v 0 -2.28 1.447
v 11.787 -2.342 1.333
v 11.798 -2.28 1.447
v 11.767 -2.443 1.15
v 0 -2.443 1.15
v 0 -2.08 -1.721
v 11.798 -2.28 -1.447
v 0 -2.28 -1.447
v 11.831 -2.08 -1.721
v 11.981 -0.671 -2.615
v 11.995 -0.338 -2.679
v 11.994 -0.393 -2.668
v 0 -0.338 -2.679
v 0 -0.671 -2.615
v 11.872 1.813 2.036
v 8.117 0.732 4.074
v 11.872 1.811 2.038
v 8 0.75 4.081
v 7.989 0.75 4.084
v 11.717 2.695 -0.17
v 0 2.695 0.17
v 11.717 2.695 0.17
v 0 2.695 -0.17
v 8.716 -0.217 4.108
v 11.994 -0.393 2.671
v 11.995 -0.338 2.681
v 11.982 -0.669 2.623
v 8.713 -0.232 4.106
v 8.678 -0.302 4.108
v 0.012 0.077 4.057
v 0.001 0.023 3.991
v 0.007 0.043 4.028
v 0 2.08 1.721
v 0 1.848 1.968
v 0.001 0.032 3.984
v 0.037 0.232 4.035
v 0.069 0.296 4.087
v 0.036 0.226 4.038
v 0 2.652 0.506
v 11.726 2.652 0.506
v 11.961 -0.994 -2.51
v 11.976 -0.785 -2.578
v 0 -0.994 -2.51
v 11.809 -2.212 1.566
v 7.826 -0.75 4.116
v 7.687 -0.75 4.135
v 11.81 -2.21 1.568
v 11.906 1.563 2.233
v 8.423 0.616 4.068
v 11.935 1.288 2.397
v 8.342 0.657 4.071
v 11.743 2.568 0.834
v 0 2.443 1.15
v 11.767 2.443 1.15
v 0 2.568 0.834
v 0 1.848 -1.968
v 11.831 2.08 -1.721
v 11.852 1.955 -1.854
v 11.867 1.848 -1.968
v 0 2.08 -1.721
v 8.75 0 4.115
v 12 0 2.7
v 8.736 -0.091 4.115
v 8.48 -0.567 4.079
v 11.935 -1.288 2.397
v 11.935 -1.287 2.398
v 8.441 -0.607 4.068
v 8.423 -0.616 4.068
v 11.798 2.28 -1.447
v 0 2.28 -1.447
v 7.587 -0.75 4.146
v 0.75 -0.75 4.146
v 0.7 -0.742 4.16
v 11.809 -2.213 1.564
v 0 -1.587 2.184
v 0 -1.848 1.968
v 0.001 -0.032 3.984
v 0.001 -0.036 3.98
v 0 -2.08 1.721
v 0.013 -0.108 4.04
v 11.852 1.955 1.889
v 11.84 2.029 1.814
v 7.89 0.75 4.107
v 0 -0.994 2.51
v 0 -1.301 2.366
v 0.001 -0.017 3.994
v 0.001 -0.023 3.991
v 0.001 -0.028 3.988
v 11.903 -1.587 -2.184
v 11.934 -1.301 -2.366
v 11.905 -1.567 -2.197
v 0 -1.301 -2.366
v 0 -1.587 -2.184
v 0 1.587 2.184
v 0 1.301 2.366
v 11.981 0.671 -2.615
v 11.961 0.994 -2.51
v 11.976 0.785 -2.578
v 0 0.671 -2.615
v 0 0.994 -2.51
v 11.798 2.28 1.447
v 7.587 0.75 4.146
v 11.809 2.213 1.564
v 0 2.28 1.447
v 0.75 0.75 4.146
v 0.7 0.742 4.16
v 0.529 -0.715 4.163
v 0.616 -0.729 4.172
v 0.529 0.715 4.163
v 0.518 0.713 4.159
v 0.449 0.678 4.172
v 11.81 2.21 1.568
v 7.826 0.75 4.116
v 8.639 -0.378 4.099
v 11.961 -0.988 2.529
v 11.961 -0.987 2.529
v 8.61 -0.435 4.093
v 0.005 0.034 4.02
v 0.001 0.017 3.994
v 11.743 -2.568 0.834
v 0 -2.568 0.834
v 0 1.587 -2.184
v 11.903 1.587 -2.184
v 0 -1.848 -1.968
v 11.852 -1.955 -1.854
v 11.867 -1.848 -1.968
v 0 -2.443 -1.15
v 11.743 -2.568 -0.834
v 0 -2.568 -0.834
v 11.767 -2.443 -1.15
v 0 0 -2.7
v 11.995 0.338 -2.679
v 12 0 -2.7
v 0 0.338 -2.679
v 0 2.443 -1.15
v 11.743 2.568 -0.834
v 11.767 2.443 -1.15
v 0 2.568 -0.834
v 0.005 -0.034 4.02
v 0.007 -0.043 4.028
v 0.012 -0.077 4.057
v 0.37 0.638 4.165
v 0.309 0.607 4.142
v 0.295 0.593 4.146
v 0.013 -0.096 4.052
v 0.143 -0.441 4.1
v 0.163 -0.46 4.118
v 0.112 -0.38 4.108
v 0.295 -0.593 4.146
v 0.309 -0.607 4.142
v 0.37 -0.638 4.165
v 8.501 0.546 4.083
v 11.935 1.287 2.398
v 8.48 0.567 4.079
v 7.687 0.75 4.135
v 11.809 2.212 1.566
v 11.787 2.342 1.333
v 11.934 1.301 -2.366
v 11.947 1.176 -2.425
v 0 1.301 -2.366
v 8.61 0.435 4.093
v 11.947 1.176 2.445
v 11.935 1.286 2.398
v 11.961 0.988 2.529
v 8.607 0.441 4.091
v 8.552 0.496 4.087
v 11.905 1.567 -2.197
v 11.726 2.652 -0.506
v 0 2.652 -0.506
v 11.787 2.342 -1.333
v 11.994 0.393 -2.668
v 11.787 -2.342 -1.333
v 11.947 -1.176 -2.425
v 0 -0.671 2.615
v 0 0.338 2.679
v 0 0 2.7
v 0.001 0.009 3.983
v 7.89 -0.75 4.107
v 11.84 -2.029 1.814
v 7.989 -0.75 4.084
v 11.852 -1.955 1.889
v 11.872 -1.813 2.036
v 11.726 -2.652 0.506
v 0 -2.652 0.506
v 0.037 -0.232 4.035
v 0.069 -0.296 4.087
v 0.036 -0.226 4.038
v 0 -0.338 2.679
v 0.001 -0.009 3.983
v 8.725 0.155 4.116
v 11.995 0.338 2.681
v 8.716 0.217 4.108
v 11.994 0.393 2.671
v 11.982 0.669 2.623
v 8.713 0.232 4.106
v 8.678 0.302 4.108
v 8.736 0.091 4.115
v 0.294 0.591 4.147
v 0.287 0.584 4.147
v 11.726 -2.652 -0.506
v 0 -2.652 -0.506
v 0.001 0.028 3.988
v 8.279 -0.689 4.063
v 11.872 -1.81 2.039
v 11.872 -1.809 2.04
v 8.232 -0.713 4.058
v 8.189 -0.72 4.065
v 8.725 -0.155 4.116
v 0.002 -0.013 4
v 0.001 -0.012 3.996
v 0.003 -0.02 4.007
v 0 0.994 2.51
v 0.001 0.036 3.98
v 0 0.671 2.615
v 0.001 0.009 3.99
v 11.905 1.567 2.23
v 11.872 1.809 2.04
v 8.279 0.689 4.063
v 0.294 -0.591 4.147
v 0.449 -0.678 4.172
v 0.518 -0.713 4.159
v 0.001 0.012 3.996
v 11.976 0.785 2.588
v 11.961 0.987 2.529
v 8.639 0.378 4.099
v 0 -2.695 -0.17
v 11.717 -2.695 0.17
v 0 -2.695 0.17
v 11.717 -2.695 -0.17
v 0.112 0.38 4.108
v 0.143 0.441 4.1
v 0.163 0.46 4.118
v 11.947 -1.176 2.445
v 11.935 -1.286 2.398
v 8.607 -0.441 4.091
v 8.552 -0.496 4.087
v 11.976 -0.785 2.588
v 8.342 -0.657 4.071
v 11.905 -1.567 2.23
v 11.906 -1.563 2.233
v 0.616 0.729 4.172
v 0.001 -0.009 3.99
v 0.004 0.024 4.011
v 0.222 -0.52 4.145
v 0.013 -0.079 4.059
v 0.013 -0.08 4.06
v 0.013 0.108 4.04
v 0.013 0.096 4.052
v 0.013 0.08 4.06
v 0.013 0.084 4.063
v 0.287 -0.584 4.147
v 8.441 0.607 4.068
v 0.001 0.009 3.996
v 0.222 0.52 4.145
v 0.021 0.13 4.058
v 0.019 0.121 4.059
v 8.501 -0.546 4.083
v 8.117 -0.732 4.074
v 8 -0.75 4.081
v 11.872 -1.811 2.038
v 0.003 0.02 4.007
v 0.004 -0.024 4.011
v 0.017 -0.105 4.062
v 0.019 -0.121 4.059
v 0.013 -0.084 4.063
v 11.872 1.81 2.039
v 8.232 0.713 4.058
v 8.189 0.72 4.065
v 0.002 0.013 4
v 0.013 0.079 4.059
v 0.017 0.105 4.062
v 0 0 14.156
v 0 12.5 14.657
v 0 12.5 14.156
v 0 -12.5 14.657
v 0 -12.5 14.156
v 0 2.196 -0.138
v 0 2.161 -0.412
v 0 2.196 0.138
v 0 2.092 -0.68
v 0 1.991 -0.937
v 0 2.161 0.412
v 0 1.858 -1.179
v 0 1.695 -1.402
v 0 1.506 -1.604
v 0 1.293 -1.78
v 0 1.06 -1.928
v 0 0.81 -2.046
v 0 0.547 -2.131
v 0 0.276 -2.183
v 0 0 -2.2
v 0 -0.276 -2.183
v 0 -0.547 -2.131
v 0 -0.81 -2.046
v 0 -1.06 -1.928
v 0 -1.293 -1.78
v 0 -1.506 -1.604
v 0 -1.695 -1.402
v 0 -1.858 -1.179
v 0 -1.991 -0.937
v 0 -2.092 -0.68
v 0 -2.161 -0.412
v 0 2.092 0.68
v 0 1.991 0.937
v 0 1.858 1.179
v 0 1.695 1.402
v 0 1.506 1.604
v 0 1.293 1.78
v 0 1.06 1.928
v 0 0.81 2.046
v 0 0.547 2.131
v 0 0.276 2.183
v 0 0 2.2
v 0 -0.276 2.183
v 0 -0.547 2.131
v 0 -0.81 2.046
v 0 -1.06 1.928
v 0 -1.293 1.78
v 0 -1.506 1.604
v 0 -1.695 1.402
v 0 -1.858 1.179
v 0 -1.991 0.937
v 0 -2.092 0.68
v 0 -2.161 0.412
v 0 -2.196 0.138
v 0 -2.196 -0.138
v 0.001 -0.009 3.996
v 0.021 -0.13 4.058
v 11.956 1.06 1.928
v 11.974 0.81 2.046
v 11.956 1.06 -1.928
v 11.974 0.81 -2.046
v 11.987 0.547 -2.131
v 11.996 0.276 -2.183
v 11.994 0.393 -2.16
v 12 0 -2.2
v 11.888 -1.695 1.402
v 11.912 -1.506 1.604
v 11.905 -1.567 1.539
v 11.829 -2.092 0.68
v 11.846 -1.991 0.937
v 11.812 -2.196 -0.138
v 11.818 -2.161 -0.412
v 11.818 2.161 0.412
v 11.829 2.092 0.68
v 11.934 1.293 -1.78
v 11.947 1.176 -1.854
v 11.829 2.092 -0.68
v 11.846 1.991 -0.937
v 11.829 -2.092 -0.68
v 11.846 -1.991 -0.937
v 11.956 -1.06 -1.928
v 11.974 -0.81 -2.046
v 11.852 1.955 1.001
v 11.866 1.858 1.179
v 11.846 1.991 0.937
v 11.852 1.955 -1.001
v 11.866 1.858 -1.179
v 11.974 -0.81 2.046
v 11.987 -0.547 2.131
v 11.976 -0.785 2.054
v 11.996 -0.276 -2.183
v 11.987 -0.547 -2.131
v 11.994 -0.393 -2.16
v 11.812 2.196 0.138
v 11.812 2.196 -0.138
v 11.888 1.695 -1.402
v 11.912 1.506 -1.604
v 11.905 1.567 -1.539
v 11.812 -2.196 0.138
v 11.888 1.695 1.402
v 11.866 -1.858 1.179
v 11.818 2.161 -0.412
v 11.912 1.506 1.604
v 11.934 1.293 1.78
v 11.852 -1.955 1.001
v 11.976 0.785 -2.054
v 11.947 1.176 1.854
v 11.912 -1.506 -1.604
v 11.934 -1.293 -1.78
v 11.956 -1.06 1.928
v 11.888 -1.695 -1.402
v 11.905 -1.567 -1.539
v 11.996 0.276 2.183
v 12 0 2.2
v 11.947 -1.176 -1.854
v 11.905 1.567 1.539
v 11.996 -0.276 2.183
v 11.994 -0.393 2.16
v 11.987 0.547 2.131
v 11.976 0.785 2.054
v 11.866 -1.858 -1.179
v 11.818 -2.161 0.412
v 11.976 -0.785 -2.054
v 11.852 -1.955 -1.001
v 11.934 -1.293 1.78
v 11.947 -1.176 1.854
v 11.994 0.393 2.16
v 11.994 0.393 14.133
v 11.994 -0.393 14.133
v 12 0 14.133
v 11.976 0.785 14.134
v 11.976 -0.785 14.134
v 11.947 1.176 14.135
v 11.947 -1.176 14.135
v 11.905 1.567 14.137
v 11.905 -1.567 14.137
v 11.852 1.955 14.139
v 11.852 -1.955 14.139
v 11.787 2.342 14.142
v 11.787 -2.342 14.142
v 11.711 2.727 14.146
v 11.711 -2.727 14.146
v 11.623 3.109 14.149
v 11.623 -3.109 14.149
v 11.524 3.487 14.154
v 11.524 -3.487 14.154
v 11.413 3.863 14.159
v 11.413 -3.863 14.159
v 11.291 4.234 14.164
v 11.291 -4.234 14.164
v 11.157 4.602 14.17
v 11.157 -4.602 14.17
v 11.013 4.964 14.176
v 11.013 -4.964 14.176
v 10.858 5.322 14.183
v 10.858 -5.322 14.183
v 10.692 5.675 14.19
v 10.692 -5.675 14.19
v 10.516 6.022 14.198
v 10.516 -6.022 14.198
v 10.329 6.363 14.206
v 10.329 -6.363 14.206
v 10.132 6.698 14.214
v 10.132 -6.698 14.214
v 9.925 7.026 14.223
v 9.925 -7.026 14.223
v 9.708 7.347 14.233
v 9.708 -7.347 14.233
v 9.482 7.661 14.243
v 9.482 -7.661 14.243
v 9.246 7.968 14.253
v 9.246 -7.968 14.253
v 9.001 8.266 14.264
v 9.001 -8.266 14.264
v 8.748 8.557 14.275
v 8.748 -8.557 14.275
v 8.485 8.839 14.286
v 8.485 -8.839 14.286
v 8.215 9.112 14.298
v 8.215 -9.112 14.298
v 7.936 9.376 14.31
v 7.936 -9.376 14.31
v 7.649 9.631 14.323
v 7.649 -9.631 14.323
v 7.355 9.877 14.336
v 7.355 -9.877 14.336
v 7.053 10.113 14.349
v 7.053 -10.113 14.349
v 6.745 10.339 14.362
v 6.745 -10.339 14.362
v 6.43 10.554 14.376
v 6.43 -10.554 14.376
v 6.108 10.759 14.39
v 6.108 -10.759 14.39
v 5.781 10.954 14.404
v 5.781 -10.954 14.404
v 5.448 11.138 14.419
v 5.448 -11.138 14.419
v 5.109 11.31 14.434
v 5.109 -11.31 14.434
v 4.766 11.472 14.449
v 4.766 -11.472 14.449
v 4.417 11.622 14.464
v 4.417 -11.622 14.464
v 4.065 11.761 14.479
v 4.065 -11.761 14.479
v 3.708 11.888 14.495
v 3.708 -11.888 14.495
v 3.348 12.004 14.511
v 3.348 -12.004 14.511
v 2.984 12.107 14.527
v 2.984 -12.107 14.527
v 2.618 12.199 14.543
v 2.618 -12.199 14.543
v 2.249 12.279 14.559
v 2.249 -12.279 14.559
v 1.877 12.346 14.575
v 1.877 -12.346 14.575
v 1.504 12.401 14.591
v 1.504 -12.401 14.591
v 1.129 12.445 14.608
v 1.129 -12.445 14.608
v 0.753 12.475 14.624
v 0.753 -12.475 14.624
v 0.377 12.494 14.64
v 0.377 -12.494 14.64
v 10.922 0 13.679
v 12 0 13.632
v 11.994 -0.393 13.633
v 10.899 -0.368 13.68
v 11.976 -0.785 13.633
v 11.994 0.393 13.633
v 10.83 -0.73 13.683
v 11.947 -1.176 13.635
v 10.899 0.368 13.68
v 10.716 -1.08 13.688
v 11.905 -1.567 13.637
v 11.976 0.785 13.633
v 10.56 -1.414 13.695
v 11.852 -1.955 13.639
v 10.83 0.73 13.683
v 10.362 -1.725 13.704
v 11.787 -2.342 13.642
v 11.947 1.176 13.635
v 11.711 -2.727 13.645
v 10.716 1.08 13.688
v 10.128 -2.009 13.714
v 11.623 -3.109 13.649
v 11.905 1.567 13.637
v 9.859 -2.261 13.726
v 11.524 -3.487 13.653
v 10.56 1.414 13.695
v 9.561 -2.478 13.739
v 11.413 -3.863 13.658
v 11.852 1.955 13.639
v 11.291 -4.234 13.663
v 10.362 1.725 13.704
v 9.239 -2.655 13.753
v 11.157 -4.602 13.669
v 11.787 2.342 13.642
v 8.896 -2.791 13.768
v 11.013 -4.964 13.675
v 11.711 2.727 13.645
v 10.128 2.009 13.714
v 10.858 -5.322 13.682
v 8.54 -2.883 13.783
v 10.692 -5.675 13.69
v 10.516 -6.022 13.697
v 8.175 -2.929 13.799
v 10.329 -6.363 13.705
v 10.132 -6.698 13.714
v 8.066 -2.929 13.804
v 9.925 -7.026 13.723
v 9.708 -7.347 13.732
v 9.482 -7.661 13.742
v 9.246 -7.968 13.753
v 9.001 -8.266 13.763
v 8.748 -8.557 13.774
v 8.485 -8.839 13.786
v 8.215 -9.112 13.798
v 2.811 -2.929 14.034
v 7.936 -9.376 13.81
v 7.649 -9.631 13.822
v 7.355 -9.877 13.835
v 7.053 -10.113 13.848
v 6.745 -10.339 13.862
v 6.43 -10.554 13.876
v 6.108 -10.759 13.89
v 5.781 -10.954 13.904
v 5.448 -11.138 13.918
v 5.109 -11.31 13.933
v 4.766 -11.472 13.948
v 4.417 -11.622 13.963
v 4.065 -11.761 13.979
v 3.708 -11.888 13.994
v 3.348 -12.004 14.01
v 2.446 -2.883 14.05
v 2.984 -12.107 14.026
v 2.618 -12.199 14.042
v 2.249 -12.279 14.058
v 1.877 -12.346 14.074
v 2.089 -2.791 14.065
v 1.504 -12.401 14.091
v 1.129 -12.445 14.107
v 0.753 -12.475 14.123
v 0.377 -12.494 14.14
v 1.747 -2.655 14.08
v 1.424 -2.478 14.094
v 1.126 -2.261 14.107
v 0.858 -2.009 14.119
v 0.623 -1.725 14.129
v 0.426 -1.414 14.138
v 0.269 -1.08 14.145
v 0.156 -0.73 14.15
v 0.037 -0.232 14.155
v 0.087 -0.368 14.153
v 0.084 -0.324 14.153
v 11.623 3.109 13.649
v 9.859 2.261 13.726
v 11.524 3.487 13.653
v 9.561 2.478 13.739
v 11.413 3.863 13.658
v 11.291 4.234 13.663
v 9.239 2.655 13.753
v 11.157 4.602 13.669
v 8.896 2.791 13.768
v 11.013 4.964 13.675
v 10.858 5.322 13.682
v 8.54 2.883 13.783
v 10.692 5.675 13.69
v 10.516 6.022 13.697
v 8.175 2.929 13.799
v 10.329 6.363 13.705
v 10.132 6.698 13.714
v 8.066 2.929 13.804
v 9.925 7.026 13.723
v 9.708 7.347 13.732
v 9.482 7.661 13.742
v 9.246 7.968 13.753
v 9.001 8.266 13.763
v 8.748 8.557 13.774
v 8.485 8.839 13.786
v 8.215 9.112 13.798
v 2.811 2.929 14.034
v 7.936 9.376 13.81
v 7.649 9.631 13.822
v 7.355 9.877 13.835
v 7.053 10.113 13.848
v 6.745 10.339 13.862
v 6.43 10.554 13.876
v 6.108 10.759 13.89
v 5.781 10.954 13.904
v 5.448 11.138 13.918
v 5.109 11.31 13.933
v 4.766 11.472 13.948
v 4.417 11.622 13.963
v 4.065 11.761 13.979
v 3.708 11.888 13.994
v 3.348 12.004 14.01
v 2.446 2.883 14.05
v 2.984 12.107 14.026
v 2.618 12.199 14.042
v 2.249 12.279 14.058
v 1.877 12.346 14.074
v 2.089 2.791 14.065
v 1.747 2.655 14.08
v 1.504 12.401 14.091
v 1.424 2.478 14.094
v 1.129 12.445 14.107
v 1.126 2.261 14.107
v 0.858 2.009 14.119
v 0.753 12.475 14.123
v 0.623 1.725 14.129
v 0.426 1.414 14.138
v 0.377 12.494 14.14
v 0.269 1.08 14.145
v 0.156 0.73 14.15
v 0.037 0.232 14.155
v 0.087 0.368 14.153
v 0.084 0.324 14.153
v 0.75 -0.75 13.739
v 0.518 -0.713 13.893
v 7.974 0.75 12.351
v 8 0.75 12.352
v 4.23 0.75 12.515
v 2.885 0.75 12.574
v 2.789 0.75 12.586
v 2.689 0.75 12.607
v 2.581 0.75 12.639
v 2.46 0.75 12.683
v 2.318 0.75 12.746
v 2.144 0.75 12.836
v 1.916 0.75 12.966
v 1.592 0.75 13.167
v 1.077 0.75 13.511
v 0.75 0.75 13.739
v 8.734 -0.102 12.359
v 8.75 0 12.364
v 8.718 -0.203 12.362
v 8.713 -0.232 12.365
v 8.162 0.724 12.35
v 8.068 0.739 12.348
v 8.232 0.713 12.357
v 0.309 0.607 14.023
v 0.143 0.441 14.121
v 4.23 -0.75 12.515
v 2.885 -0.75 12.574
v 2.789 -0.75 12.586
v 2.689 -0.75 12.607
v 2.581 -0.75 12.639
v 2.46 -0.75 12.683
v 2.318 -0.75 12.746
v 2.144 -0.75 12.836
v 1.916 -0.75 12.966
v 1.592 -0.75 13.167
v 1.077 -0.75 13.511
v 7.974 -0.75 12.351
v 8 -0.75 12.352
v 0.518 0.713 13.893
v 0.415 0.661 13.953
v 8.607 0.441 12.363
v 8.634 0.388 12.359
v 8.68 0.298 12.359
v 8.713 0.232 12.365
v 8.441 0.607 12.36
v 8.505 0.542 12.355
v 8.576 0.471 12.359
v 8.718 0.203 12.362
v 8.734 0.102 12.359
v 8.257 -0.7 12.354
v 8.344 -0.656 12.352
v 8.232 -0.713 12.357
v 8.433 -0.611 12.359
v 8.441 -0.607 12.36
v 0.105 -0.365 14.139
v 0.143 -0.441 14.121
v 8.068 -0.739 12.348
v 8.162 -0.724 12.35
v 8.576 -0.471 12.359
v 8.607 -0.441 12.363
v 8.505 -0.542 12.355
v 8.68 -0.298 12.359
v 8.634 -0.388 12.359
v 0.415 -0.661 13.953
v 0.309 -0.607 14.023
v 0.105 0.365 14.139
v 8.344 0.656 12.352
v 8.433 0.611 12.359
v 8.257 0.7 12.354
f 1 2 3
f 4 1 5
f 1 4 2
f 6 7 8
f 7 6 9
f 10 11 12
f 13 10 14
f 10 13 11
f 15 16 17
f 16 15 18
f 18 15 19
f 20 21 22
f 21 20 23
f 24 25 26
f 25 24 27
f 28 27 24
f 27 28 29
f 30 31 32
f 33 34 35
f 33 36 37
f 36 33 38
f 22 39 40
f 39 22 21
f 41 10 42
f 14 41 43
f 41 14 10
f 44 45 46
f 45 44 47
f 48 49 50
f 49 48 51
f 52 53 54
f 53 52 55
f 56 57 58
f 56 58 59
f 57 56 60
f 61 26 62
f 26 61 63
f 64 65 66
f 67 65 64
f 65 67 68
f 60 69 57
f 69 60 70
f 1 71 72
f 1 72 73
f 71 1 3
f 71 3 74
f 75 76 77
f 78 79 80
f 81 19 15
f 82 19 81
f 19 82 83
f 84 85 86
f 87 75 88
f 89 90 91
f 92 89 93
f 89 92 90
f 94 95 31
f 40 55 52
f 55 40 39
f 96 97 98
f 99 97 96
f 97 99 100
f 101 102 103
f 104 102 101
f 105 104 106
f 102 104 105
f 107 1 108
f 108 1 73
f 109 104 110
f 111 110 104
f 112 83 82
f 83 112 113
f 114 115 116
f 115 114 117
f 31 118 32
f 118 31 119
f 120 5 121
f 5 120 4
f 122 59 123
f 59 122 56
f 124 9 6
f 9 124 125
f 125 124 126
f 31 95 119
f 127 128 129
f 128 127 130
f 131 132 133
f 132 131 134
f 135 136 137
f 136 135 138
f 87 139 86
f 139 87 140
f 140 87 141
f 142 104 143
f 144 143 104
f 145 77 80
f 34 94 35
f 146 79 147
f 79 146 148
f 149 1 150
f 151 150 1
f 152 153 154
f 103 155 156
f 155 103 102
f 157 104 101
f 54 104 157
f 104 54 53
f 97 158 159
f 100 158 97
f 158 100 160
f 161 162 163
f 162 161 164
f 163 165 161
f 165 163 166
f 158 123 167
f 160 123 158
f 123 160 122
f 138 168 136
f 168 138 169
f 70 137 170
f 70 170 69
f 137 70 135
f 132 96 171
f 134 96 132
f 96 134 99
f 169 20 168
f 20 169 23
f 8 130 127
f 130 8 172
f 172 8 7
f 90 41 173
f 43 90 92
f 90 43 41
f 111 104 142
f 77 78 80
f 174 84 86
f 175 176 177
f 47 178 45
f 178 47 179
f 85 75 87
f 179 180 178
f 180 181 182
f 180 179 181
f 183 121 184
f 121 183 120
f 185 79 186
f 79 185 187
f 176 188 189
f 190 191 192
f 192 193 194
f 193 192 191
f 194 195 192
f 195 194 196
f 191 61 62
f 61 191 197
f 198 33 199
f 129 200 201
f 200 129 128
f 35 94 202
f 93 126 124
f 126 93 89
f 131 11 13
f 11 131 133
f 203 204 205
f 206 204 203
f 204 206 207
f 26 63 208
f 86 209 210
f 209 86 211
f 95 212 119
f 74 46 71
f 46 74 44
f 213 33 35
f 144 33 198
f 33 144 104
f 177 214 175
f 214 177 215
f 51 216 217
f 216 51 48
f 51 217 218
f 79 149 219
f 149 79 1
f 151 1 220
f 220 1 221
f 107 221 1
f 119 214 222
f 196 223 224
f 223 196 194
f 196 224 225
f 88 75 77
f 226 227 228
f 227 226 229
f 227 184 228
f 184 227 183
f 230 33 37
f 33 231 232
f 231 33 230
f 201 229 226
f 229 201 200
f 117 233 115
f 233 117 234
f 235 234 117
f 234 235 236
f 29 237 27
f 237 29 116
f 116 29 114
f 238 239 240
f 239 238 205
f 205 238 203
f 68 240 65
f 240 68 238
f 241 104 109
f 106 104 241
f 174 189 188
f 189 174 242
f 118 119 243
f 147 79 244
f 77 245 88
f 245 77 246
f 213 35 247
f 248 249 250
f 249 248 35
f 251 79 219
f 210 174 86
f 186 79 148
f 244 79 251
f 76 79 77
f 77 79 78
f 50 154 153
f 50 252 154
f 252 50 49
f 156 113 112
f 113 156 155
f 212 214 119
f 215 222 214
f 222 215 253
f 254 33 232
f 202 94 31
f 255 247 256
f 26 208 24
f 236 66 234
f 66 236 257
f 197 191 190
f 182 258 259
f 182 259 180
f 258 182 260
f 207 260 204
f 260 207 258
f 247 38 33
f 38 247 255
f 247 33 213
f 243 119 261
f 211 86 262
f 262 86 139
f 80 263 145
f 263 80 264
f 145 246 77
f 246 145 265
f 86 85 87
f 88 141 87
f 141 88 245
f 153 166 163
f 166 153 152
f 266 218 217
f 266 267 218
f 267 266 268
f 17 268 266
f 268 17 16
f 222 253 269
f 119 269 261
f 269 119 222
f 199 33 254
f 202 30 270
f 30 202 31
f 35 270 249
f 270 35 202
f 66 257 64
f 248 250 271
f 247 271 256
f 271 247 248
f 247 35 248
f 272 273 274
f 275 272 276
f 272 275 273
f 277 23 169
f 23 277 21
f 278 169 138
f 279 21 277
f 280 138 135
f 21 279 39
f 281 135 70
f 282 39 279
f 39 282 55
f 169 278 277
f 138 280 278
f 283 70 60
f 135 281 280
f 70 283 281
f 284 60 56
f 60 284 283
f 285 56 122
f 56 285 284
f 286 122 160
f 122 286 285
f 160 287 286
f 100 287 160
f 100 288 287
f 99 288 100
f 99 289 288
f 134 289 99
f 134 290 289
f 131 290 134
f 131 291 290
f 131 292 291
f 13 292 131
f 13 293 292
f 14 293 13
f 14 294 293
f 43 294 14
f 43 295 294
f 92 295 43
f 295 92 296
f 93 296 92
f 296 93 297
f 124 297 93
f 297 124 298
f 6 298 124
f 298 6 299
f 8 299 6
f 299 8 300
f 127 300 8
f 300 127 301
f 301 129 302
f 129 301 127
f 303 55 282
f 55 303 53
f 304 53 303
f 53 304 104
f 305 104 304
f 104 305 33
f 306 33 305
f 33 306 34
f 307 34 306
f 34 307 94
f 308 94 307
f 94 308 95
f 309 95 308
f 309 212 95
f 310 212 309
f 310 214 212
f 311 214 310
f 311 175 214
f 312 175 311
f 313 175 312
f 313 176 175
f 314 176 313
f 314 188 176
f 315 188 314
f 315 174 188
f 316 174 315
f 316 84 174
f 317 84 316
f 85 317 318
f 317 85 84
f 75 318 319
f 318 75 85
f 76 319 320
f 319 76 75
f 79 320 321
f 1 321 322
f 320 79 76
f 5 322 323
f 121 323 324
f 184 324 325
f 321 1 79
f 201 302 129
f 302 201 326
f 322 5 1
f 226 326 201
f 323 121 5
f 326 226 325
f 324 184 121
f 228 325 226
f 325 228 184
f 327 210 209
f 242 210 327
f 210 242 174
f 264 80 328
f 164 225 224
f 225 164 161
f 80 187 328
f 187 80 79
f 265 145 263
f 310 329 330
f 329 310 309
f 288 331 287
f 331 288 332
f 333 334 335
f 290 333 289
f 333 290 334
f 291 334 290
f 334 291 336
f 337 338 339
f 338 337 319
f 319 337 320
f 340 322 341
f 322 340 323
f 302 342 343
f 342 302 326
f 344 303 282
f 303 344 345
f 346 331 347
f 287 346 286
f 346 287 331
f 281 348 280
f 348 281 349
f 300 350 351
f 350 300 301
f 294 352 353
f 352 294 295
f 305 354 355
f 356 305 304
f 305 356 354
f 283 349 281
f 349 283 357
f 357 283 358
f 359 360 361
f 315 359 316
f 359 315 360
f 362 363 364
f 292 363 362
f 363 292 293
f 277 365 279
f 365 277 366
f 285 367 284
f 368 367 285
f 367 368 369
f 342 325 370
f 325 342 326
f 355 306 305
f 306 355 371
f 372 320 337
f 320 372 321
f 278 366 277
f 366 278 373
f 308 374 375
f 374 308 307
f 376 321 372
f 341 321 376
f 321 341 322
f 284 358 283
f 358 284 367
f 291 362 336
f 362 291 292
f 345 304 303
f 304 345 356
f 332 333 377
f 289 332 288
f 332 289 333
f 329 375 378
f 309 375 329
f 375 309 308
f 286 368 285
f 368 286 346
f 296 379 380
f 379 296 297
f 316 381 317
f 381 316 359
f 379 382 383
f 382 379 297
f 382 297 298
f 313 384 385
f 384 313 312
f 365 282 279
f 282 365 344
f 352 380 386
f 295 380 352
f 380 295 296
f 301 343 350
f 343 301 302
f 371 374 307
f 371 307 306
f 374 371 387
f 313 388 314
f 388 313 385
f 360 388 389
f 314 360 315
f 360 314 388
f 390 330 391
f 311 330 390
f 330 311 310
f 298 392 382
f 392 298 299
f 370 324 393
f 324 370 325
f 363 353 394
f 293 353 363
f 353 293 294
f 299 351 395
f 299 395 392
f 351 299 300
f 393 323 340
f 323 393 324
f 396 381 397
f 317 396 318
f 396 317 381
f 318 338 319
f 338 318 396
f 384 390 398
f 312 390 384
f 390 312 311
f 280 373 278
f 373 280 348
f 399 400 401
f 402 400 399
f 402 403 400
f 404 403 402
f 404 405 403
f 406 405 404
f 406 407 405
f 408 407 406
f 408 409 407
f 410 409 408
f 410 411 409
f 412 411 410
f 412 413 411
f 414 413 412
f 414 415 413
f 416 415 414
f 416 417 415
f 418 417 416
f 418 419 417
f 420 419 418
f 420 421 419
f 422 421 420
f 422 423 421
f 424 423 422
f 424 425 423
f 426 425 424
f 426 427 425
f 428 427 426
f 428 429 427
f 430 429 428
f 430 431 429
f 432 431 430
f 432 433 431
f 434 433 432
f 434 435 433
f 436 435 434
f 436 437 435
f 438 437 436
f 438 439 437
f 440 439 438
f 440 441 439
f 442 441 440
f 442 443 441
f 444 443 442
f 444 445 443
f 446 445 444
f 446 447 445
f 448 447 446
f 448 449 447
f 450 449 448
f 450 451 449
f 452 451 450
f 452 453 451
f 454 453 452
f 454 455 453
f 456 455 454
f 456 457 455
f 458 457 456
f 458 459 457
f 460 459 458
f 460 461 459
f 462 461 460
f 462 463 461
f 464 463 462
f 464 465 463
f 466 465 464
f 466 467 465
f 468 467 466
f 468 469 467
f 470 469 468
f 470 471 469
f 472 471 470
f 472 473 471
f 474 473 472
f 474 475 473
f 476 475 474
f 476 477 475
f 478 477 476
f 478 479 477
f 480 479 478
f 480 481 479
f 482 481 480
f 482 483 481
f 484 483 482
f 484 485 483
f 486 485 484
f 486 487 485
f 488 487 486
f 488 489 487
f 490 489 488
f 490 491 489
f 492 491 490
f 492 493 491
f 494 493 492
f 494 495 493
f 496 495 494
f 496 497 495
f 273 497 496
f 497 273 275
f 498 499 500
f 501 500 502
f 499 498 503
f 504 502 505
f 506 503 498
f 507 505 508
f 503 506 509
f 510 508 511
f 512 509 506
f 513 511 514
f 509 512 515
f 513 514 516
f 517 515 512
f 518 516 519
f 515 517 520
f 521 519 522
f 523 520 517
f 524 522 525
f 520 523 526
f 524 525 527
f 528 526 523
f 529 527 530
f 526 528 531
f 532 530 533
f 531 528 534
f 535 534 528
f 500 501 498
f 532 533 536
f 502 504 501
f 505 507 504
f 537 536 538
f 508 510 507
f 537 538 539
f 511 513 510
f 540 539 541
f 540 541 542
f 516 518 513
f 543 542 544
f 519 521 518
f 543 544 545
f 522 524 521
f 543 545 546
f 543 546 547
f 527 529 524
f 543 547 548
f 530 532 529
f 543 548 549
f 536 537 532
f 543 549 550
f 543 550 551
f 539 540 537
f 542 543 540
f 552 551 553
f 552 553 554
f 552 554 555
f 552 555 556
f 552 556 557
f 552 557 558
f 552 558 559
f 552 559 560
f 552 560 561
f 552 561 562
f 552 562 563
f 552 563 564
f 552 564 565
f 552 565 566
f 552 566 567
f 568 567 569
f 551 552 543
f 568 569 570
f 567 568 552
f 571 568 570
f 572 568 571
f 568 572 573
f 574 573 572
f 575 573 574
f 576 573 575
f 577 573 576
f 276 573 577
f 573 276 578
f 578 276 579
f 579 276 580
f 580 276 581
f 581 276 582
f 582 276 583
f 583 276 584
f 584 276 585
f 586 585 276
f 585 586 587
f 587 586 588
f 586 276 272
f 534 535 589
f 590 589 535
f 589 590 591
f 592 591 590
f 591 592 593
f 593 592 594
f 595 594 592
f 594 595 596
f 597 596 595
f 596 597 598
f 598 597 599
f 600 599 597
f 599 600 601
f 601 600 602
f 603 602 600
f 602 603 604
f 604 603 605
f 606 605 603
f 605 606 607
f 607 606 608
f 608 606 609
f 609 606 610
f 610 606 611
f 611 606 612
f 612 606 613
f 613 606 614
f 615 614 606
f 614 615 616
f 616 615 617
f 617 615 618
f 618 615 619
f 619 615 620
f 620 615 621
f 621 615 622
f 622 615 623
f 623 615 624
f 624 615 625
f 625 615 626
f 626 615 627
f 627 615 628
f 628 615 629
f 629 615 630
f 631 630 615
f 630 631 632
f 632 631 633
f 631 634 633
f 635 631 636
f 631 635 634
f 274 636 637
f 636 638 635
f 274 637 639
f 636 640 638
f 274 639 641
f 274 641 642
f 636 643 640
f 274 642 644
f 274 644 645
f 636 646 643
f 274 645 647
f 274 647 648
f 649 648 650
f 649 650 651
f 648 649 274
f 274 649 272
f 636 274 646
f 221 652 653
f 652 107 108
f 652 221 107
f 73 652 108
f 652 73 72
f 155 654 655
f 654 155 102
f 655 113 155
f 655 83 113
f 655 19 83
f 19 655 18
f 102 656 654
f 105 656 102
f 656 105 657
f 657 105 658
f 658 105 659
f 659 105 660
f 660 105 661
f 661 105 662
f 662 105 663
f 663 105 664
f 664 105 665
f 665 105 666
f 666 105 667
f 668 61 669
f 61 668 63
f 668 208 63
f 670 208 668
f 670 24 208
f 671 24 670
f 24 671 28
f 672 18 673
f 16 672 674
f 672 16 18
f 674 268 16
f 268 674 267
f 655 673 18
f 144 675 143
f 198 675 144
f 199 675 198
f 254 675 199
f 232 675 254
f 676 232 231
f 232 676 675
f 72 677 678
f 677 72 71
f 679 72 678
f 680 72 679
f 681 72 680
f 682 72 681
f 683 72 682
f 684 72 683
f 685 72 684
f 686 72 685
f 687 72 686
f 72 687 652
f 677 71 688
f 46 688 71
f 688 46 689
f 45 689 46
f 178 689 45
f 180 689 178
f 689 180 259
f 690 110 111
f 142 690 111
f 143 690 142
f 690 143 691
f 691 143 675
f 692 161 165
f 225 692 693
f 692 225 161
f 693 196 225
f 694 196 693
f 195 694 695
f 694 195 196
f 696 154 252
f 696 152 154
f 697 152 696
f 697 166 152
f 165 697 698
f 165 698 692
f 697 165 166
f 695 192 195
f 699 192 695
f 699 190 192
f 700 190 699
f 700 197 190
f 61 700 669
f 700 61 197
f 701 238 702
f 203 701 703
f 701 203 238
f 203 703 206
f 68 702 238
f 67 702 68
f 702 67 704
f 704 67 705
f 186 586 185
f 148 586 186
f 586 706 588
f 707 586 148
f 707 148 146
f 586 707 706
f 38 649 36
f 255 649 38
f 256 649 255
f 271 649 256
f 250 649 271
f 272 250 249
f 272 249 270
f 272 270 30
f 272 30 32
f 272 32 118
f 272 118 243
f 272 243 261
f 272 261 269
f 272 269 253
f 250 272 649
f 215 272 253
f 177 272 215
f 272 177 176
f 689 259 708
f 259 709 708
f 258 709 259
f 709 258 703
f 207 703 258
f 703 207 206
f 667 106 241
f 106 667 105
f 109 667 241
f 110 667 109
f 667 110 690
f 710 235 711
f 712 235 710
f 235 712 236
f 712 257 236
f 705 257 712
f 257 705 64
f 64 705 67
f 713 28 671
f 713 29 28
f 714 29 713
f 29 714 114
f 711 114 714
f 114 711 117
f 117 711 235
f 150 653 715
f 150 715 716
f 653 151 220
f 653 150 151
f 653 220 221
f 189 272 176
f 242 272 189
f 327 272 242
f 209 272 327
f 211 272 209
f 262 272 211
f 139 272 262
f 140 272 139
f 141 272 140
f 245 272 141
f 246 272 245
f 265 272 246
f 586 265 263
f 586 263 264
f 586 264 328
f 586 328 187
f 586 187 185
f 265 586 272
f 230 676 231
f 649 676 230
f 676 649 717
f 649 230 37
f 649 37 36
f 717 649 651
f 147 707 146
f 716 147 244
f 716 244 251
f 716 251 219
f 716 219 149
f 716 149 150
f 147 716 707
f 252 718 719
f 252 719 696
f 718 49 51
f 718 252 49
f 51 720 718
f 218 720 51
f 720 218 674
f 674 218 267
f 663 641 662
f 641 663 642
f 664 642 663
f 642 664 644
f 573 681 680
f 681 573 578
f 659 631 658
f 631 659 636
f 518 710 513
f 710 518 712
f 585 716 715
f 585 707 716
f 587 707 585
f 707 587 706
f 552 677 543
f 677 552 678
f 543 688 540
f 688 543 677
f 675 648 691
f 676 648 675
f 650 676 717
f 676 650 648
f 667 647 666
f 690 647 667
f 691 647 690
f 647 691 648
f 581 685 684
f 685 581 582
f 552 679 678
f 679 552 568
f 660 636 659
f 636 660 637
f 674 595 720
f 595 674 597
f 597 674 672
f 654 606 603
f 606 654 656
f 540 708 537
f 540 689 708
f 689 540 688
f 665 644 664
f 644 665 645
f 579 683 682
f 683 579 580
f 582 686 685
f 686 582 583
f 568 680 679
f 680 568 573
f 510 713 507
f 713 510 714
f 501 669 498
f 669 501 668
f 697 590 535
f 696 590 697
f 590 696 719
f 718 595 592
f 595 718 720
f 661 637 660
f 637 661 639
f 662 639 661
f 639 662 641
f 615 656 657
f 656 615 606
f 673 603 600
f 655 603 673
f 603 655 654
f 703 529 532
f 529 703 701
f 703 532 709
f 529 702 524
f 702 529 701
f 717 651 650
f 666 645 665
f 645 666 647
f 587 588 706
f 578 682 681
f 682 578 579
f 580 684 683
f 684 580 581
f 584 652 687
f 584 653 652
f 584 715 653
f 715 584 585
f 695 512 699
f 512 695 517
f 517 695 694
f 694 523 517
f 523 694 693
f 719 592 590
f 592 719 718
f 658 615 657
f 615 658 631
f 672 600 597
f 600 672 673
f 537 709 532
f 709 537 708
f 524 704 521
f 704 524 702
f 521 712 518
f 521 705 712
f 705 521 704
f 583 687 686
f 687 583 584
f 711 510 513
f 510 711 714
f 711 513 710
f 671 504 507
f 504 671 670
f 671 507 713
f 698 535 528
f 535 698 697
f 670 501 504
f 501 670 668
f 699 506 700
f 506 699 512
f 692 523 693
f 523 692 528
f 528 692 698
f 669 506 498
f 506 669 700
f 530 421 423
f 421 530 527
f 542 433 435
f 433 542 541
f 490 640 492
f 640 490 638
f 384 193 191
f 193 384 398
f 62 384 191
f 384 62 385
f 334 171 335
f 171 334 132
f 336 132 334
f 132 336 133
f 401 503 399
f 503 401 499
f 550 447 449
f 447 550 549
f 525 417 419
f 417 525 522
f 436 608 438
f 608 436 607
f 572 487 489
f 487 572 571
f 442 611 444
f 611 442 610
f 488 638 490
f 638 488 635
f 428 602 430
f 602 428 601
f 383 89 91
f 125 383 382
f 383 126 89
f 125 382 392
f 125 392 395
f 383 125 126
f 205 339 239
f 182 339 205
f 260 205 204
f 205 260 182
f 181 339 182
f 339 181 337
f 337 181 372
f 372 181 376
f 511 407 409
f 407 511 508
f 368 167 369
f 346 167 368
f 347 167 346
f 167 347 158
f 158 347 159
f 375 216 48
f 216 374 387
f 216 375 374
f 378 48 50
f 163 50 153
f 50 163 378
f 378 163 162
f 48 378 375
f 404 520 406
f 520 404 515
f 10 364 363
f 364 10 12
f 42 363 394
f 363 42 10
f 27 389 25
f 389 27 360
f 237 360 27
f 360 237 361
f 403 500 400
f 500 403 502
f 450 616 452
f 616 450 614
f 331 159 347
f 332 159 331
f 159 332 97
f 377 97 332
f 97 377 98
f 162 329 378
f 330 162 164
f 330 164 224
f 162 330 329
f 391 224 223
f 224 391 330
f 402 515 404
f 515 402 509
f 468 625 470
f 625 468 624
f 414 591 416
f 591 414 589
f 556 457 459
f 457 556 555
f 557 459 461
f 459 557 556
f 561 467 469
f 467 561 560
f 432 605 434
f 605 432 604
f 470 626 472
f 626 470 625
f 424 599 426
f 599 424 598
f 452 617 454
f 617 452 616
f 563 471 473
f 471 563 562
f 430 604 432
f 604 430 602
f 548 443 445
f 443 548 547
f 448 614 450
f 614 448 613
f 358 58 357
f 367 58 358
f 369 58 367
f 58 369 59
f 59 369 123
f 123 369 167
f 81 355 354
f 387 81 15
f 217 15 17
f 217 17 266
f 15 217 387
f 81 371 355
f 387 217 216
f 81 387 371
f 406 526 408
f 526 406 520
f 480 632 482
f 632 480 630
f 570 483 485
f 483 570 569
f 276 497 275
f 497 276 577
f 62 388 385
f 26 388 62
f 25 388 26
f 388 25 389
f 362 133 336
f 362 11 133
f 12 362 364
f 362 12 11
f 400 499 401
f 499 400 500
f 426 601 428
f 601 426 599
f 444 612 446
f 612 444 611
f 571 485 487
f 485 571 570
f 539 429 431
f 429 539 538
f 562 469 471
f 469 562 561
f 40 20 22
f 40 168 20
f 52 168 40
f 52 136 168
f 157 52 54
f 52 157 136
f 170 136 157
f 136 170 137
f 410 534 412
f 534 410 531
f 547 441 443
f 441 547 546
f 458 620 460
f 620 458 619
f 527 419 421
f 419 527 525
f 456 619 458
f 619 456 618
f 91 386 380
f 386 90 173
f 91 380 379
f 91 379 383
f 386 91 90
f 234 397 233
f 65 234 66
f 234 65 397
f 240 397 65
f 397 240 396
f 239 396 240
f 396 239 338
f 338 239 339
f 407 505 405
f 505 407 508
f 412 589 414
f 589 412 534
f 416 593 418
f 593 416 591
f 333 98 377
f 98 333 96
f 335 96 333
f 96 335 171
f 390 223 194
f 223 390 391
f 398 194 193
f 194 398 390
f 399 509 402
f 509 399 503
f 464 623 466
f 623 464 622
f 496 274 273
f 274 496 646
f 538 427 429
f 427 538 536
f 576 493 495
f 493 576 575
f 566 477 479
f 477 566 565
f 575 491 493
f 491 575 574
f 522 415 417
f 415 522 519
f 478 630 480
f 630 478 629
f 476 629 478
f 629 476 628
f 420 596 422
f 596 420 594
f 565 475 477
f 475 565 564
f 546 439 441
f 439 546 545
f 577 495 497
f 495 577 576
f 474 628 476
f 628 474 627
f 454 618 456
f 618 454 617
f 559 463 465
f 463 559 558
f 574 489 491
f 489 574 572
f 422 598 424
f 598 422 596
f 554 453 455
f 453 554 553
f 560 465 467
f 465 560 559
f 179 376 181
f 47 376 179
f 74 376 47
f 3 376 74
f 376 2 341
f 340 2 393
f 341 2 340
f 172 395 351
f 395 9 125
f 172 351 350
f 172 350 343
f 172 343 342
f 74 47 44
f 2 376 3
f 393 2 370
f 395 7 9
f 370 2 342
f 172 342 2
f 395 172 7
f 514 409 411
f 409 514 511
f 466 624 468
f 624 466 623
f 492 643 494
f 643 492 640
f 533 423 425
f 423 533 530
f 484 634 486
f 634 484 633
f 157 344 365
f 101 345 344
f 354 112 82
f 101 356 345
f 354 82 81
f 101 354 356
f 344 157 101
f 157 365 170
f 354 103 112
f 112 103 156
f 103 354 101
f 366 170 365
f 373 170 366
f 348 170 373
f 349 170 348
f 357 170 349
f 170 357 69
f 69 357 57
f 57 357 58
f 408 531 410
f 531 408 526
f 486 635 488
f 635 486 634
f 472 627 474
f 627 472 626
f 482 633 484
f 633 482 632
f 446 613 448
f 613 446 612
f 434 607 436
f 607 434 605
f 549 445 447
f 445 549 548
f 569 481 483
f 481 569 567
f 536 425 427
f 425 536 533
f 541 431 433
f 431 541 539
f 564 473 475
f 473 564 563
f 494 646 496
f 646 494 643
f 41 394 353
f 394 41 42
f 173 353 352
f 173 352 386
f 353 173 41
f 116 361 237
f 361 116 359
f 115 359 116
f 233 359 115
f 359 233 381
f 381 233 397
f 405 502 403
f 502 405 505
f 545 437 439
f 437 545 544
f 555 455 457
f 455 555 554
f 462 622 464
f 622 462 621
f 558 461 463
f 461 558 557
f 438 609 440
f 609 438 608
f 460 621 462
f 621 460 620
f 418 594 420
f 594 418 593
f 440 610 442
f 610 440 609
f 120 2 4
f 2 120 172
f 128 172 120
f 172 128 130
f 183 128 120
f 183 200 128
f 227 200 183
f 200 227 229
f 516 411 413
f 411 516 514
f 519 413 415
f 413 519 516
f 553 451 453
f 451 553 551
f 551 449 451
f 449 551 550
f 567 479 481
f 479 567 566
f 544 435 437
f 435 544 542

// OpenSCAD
tailmount_printing = false;
tailmount_tailboom_dia = 4 ;
tailmount_tailboom_clearance = 0.2;
tailmount_tube_wall_thickness = 0.5;
tailmount_pylon_thickness = 1.5;
tailmont_plate_thickness = 0.5;
tailmount_plate_y_len = 25;
tailmount_x_len = 12;
tailmount_standoff_height = 12.5;
tailmount_incidence_angle = 2.5;
tailmount_plate_fillet_width = 2;

// x_length
// standoff_height
// tailboom_dia

module tailboom_tube(){
   dia1 = tailmount_tailboom_dia + 2 * tailmount_tailboom_clearance;
   dia2 = dia1 + 2 * tailmount_tube_wall_thickness;
   offset = (dia1 + tailmount_pylon_thickness)/2 +1 ;
   rotate([0,90,0]){
      difference(){
         hull(){
//            translate([-offset,0,0]){
//              cylinder(d= tailmount_pylon_thickness, h = tailmount_x_len/1.5 ,$fn = 20);
//            }
          translate([-offset,,0,tailmount_pylon_thickness/2]){
               sphere(d = tailmount_pylon_thickness, $fn = 50);
            }
            translate([-offset,,0,tailmount_x_len/1.5 - tailmount_pylon_thickness/2]){
               sphere(d = tailmount_pylon_thickness, $fn = 50);
            }
            cylinder(d= dia2, h = tailmount_x_len,$fn = 50);
           

         }
         translate([0,0,-2]){
            cylinder(d= dia1, h = tailmount_x_len + 4,$fn = 50);
         }
      }
   }
}

module tailmount_plate(){
   offset = tailmount_tailboom_dia /2 +  tailmount_tailboom_clearance + tailmount_standoff_height - tailmont_plate_thickness;
   translate([-1,-tailmount_plate_y_len/2,offset]){
      rotate([0,tailmount_incidence_angle,0]){
         cube ( [tailmount_x_len+2,tailmount_plate_y_len,tailmont_plate_thickness]);
       
      }
   }
}

module tailboom_pylon(){
   h1 = tailmount_x_len * tan(tailmount_incidence_angle);
   hp1 = tailmount_standoff_height - ( tailmount_tube_wall_thickness+ tailmont_plate_thickness/2);
//   pts = [
//   [0,0],
//   [0,hp1 + h1 -0.1],
//   [tailmount_x_len,hp1 -0.1],
//   [tailmount_x_len,0]
//   ];
   offset = tailmount_tailboom_dia/2 
      + tailmount_tailboom_clearance 
      + tailmount_tube_wall_thickness/2;

hull(){
translate([tailmount_pylon_thickness/2,0,offset]){
   cylinder ( d= tailmount_pylon_thickness, h = hp1 + h1 -0.3, $fn = 20);
}

translate([tailmount_x_len/ 1.5,0,offset]){
   cylinder ( d= tailmount_pylon_thickness, h = hp1 -0.3, $fn = 20);
}
}

//   translate([0,0,offset]){
//      rotate([90,0,0]){
//         translate([0,0,-tailmount_pylon_thickness/2]){
//            linear_extrude(height = tailmount_pylon_thickness){
//               polygon(points = pts);
//            }
//         }
//      }
//   }
}

module tailmount_plate_fillet()
{
   fw = tailmount_plate_fillet_width;
//   pts = [
//      [-fw,0],
//      [0,-fw * 1.5],
//      [0,fw * 1.5]
//   ];
   z_offset =  tailmount_tailboom_dia /2 +  tailmount_tailboom_clearance + tailmount_standoff_height - tailmont_plate_thickness;
   translate([0,0,z_offset]){
      rotate([0,tailmount_incidence_angle,0]){
//         translate([tailmount_x_len/1.5,0,0]){
//            rotate([0,-90,0]){
//               linear_extrude(height = tailmount_x_len/1.5){
//                  polygon(points = pts);
//               }
//            }
//         }
hull(){
  translate([fw*1.5,0,-fw ]){
      cylinder( d1 = 0, d2 = fw *3, h = fw, $fn = 50);
  }
   translate([tailmount_x_len/ 1.5,0,-fw ]){
      cylinder( d1 = 0, d2 = fw *3, h = fw, $fn = 50);
  }
      }
   }
}
}

module tail_mount(){
  zoffset = tailmount_tailboom_dia/2 +
     tailmount_tailboom_clearance +
     tailmount_tube_wall_thickness ;
cube_height = tailmount_standoff_height +  tailmount_tailboom_dia +
    2* tailmount_tailboom_clearance +
    2* tailmount_tube_wall_thickness;
   intersection(){
      union(){
         tailboom_tube();
         tailmount_plate();
         tailboom_pylon();
         tailmount_plate_fillet();
      }
     
      difference(){
        translate([0,0,-zoffset]){
           scale ([2*tailmount_x_len/tailmount_plate_y_len,1,1]){
             cylinder (d= tailmount_plate_y_len , h = 30,$fn = 200);
           }
        }
        translate([-10,-((tailmount_plate_y_len+1)/2),-(zoffset+1)]){
           cube([10,tailmount_plate_y_len+1,cube_height + 2]);
        }
     }
   }    
}
if ( tailmount_printing)
{
   rotate([0,-90,0]){
      tail_mount();
   }
}else{
 tail_mount();
  // tailboom_pylon();


}

//tailmount_plate();
